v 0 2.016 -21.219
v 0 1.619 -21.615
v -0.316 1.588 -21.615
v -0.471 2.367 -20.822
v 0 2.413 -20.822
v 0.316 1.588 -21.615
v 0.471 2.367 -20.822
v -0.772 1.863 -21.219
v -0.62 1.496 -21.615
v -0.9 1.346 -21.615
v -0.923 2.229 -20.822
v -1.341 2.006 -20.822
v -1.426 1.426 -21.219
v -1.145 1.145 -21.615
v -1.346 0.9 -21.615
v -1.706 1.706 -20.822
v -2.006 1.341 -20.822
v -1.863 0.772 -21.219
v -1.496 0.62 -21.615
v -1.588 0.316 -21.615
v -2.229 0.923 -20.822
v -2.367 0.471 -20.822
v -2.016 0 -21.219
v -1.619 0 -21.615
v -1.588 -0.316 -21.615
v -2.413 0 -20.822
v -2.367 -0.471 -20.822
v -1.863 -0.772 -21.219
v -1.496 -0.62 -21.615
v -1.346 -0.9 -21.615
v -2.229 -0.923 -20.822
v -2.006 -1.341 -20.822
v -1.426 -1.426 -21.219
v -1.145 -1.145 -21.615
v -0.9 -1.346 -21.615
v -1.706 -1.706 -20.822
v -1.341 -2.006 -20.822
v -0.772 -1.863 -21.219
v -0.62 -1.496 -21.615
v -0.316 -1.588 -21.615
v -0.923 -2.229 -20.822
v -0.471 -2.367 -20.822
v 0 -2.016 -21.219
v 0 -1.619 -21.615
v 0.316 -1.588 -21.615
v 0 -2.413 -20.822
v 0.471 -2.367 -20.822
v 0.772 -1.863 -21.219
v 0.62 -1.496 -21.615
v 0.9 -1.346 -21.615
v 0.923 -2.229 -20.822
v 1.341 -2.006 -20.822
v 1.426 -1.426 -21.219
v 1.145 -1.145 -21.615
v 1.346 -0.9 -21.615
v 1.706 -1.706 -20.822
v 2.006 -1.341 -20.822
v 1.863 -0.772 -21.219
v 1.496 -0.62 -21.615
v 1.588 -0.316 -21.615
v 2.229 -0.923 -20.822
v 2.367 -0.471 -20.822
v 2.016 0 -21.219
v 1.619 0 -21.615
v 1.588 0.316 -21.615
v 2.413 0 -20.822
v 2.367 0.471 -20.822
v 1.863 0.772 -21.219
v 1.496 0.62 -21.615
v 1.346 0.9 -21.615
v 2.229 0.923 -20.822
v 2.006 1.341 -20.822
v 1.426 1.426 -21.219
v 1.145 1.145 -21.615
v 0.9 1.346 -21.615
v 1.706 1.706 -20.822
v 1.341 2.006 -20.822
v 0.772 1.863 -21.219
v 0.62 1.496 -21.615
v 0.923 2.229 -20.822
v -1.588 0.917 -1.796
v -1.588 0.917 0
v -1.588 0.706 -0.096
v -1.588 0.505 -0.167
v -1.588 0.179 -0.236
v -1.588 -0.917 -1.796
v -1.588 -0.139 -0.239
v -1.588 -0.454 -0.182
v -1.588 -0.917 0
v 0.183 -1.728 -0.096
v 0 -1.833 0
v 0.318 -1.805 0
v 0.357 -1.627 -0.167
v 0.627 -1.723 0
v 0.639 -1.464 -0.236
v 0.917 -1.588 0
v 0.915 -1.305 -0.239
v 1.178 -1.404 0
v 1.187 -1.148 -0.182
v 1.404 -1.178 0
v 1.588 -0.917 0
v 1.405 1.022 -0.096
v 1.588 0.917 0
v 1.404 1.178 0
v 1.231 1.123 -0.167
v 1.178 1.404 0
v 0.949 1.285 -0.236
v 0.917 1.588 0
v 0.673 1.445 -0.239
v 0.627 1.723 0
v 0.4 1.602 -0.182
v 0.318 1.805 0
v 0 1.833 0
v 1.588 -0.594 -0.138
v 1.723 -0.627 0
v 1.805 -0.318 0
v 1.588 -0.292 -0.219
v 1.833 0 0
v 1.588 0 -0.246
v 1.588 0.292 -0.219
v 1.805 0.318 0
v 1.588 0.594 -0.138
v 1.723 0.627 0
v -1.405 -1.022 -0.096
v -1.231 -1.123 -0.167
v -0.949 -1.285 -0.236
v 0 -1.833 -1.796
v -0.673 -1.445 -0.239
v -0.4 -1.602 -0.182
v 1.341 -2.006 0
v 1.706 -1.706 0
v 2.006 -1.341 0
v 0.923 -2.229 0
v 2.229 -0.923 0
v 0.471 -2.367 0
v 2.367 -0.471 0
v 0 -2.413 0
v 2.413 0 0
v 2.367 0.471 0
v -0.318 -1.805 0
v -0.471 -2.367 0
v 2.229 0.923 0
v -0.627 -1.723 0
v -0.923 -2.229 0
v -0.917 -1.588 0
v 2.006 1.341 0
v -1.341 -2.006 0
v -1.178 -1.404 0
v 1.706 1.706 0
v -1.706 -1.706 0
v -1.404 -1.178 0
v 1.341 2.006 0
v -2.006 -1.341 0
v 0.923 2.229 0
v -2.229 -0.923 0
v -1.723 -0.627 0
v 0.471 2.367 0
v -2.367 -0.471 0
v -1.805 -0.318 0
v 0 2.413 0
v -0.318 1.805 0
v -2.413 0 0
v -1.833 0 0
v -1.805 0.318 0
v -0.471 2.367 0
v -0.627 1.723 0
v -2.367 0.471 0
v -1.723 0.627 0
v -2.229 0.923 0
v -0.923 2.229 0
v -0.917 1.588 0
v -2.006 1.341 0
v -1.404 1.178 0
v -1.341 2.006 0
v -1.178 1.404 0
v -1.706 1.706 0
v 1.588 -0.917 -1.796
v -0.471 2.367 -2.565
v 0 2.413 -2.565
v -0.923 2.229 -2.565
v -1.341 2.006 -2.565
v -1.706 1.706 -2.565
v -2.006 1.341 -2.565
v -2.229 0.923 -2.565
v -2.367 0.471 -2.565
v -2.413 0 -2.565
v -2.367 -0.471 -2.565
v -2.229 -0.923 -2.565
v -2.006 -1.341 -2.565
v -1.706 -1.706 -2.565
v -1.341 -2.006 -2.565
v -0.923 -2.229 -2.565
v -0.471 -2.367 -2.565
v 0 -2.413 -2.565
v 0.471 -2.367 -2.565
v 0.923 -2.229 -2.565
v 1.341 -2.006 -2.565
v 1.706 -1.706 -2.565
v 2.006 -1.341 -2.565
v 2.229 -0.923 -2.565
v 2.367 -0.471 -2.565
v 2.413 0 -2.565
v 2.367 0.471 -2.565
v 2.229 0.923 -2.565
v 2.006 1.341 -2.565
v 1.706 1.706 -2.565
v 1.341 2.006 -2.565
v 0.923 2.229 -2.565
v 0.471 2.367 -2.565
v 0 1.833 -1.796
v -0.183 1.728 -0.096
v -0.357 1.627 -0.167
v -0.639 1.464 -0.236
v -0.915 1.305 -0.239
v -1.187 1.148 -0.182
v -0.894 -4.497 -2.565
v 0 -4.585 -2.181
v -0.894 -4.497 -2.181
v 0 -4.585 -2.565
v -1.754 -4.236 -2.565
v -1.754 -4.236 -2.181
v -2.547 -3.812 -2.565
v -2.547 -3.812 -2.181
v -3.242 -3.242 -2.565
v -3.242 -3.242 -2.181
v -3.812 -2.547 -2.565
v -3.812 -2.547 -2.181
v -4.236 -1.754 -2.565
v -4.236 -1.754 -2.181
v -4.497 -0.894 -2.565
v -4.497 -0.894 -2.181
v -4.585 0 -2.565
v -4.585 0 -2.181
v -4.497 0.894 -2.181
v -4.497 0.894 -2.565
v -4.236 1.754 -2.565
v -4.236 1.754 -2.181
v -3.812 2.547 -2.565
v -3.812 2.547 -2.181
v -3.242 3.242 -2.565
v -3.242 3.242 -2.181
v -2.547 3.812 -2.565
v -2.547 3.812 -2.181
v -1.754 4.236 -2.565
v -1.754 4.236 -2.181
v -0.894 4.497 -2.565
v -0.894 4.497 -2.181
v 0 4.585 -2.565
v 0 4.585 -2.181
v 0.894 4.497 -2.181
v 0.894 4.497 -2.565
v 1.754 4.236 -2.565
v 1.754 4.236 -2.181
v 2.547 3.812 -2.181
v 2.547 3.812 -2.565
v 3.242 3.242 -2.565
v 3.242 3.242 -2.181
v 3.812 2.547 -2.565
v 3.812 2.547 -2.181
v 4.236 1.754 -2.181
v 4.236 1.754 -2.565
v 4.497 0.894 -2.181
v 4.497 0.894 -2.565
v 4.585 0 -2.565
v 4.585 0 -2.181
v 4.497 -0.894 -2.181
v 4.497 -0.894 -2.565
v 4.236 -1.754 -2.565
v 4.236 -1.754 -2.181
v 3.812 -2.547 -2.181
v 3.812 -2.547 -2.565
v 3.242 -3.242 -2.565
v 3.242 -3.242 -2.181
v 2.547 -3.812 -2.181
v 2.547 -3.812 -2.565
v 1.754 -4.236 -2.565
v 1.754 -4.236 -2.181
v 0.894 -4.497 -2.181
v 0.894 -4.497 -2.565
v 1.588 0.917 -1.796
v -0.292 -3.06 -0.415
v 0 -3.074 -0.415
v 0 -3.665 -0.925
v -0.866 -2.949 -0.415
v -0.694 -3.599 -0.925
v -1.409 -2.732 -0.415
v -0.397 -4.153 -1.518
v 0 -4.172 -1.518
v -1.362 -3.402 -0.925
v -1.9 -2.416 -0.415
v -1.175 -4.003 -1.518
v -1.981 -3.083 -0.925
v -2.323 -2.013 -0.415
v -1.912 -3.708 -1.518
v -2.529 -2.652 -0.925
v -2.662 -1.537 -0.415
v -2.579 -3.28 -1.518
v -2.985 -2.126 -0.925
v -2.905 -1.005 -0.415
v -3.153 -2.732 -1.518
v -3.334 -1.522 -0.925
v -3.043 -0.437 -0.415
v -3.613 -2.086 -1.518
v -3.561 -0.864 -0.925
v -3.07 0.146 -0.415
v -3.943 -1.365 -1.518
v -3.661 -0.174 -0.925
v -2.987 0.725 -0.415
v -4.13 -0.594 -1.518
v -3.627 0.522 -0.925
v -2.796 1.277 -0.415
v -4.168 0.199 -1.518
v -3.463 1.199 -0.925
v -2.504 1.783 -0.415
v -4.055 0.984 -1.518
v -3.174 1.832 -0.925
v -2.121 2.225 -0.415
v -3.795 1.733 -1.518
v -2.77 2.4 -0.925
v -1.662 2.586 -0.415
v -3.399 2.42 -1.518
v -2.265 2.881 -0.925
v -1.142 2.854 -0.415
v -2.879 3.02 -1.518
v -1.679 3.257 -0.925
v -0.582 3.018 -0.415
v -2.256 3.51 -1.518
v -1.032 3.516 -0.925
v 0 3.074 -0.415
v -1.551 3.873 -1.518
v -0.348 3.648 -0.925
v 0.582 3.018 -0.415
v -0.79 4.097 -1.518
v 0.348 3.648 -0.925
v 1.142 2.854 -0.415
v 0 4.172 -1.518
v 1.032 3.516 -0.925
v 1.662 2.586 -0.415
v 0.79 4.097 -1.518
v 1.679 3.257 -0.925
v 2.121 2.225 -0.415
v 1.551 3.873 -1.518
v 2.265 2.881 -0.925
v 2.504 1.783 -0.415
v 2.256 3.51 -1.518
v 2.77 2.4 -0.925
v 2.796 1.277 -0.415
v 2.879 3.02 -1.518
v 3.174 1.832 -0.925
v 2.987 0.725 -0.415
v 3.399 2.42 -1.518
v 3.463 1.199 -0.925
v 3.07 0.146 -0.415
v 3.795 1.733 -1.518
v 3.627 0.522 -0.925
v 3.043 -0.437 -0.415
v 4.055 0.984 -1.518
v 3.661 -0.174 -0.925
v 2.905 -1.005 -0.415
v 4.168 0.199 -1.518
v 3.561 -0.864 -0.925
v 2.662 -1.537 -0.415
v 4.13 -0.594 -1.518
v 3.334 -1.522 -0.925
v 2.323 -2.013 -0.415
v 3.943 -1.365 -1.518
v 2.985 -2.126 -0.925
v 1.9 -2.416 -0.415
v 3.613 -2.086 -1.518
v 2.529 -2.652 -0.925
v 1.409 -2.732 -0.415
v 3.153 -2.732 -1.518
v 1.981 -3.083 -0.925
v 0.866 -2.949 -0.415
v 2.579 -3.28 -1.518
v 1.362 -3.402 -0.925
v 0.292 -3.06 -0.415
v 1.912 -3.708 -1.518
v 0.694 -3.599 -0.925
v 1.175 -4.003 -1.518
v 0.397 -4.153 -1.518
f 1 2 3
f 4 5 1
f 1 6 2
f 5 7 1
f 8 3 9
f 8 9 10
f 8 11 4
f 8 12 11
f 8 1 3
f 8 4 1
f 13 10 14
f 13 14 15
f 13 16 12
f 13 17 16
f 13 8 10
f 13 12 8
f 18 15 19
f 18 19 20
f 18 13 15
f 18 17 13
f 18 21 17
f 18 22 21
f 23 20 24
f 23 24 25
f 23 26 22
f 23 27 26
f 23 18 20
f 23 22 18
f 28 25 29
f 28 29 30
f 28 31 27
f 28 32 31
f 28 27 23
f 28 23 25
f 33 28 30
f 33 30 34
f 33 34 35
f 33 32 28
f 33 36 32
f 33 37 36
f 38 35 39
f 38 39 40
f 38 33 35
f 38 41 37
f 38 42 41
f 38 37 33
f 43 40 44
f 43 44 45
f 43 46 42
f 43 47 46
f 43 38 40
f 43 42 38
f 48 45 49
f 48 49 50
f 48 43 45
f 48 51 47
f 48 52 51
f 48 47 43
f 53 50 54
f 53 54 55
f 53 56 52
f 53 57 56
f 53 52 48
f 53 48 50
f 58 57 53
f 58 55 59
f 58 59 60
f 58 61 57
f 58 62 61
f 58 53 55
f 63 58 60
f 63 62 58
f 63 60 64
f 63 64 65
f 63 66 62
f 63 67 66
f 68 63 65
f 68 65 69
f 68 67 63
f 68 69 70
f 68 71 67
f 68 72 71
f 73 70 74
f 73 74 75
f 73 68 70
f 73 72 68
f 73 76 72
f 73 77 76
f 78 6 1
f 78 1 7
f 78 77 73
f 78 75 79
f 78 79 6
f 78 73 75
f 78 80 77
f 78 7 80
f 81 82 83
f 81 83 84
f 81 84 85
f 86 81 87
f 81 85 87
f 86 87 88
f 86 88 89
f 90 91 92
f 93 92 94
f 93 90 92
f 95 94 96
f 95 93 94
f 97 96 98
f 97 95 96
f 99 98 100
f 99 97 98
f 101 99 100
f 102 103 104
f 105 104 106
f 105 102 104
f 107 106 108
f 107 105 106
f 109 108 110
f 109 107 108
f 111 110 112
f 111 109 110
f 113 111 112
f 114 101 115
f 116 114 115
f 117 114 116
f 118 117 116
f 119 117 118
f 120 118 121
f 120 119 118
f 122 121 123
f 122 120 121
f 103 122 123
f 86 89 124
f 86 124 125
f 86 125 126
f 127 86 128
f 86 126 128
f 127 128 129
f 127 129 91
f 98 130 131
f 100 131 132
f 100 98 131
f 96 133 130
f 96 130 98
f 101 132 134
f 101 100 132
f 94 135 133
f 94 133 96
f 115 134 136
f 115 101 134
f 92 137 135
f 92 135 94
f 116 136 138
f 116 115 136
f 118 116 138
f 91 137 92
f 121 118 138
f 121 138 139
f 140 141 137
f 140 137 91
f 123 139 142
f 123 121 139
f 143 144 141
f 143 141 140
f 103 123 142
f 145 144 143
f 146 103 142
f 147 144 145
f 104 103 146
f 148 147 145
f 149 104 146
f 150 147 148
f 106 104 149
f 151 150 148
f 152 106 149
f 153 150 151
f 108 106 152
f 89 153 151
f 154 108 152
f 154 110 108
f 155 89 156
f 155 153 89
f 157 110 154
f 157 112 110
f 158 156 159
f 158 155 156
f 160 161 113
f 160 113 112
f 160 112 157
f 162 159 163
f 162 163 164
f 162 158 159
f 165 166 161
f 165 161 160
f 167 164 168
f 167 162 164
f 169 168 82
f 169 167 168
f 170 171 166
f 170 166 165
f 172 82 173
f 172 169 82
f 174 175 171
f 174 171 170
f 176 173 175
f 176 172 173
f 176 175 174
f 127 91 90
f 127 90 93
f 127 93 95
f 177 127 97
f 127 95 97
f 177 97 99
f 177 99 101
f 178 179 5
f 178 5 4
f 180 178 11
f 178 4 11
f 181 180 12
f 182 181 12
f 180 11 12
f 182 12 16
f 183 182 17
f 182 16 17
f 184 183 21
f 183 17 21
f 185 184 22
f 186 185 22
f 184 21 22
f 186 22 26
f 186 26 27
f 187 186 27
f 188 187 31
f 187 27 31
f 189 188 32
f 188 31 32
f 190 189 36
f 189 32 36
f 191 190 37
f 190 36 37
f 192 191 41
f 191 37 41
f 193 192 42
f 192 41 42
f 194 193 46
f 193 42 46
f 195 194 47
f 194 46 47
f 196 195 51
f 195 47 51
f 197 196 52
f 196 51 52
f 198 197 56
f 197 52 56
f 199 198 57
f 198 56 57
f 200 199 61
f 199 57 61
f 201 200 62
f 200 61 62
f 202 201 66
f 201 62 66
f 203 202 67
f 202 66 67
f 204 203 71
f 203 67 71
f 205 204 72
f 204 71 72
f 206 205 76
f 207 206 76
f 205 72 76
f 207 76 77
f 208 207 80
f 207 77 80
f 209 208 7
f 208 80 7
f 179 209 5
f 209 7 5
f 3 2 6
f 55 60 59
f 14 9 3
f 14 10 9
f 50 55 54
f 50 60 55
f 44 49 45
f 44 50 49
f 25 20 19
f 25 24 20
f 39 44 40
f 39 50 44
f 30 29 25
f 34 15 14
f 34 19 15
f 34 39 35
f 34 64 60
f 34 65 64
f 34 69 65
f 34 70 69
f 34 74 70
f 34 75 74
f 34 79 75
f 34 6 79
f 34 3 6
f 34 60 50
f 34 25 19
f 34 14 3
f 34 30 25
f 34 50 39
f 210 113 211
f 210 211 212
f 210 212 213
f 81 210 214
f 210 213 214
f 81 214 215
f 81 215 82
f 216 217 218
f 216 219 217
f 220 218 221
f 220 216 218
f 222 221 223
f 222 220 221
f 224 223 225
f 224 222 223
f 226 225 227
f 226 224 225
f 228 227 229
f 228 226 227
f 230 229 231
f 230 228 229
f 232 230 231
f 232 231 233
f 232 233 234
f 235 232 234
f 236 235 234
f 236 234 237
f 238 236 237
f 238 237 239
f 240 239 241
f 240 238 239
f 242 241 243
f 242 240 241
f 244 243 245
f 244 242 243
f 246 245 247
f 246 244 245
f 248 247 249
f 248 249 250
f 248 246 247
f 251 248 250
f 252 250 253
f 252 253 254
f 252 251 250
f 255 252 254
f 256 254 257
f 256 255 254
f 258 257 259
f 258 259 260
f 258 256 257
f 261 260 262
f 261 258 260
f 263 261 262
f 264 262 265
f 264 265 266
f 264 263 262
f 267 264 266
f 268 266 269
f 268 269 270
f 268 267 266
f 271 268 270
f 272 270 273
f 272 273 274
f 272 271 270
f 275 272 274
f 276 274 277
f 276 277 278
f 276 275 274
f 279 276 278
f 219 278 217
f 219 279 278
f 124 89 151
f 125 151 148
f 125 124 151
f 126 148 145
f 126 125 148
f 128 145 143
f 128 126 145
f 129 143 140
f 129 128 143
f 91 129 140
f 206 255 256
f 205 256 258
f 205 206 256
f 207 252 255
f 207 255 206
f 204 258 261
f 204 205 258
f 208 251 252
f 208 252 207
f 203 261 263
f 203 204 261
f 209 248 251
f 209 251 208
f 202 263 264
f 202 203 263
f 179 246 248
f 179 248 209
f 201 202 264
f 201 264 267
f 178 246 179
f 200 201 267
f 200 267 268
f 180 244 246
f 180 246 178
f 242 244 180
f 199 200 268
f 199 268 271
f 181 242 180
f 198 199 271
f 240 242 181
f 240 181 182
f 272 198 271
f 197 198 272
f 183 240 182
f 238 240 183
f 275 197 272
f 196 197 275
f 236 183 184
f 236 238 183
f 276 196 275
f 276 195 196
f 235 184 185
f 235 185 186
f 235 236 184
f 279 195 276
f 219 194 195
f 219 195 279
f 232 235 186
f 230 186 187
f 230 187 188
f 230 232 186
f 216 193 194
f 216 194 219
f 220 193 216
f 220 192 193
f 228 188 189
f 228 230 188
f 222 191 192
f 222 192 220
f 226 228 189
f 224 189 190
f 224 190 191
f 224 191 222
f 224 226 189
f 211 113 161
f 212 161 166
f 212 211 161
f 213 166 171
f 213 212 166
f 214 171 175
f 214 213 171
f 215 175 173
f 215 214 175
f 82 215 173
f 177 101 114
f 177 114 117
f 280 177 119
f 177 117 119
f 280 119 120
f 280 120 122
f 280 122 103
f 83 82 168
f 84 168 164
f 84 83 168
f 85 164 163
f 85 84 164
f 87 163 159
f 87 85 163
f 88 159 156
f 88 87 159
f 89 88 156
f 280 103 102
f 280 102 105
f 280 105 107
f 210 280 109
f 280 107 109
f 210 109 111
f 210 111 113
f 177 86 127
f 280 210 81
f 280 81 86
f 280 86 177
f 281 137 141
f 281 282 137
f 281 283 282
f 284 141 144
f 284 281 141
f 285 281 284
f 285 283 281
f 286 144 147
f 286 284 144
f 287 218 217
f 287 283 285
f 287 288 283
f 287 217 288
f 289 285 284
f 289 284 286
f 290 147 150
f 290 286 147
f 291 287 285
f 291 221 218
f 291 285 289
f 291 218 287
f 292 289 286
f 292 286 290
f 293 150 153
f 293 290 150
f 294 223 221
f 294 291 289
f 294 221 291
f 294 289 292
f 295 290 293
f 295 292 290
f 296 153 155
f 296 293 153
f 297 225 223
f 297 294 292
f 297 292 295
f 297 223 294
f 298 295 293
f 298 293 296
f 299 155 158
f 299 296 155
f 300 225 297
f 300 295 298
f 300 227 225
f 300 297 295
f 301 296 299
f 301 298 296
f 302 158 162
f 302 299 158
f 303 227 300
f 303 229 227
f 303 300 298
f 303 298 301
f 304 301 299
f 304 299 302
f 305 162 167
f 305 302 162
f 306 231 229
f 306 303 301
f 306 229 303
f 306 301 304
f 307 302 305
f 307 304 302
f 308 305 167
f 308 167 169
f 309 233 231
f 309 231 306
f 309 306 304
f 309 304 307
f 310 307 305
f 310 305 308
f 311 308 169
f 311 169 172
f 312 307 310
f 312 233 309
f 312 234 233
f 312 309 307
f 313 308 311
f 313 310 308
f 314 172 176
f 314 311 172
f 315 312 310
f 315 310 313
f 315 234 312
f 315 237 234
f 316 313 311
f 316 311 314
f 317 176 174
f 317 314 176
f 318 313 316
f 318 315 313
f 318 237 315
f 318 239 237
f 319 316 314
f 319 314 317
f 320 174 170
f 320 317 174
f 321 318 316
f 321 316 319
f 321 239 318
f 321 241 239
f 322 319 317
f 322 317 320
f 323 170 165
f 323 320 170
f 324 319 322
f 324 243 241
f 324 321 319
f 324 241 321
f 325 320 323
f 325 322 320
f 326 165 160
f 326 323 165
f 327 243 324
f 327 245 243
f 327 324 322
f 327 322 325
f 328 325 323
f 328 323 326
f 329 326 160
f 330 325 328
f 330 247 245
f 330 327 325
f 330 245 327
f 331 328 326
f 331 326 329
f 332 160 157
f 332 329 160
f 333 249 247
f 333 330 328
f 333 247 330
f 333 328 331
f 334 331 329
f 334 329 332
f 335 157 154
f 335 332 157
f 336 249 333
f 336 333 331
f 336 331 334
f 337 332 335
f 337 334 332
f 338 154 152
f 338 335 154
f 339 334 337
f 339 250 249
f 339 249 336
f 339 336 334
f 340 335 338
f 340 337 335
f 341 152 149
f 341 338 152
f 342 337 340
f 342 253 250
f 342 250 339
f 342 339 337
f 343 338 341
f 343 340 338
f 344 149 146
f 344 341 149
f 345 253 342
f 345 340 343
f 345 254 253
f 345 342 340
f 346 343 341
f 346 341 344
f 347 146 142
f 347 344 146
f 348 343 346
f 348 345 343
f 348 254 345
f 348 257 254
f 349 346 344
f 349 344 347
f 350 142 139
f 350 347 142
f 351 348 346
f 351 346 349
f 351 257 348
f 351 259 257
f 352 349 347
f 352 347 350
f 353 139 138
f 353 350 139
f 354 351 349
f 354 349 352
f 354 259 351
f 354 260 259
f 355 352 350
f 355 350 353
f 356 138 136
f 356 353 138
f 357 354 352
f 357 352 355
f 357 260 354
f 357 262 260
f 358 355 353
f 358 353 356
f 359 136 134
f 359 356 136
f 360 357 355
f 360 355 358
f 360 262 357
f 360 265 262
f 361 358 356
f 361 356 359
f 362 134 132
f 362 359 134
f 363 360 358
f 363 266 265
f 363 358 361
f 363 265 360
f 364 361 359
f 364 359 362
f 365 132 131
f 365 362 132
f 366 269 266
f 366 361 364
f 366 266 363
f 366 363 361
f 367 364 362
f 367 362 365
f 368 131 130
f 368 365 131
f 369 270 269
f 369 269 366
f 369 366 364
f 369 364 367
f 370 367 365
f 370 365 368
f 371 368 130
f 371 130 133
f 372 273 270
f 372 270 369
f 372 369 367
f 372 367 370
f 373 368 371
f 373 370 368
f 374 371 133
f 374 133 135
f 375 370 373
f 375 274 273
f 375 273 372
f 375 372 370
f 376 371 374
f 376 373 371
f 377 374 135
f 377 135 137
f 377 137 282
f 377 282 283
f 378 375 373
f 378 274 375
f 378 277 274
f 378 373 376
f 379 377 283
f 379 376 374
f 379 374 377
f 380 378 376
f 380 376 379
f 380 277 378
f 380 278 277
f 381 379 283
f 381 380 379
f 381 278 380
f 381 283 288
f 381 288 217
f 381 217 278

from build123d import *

# Parameters (mm, degrees)
SKETCH1_W          = 19.05
SKETCH1_H          = 2.413
CHAMFER1_SIZE      = 0.79375
CUT_EXTRUDE2_DEPTH = 1.79578
SKETCH6_R          = 1.833087105
CUT_EXTRUDE3_DEPTH = 1.79578
CUT_EXTRUDE3_TAPER = 45


with BuildPart() as part:
    # Sketch1 → Revolve1 (revolve)
    with BuildSketch(Plane(origin=(0, 0, 0), x_dir=(0, 0, -1), z_dir=(1, 0, 0))):
        with Locations((12.0904, 1.2065)):
            Rectangle(SKETCH1_W, SKETCH1_H)
    revolve(axis=Axis((0, 0, -21.6154), (0, 0, 1)))

    # Chamfer1
    chamfer1_edges = [part.edges().sort_by_distance(p)[0] for p in [
        (0, -2.413, -21.6154),
    ]]
    chamfer(chamfer1_edges, length=CHAMFER1_SIZE)

    # Sketch7 → Revolve2 (revolve)
    with BuildSketch(Plane(origin=(0, 0, 0), x_dir=(0, 0, -1), z_dir=(1, 0, 0))):
        with BuildLine():
            Line((2.18059, 4.5847), (2.5654, 4.5847))
            Line((2.5654, 4.5847), (2.5654, 0))
            Line((2.5654, 0), (0, 0))
            Line((0, 0), (0, 2.413))
            ThreePointArc((0, 2.413), (0.925030326, 3.664791196), (2.18059, 4.5847))
        make_face()
    revolve(axis=Axis((0, 0, 0), (0, 0, -1)))

    # Sketch5 → Cut-Extrude2 (cut)
    with BuildSketch(Plane.XY):
        Polygon((1.5875, -0.916543552), (1.5875, 0.916543552), (0, 1.833087105), (-1.5875, 0.916543552), (-1.5875, -0.916543552), (0, -1.833087105), align=None)
    extrude(amount=-CUT_EXTRUDE2_DEPTH, mode=Mode.SUBTRACT)

    # Sketch6 → Cut-Extrude3 (cut)
    with BuildSketch(Plane.XY):
        Circle(SKETCH6_R)
    extrude(amount=-CUT_EXTRUDE3_DEPTH, taper=CUT_EXTRUDE3_TAPER, mode=Mode.SUBTRACT)


solid = part.part
